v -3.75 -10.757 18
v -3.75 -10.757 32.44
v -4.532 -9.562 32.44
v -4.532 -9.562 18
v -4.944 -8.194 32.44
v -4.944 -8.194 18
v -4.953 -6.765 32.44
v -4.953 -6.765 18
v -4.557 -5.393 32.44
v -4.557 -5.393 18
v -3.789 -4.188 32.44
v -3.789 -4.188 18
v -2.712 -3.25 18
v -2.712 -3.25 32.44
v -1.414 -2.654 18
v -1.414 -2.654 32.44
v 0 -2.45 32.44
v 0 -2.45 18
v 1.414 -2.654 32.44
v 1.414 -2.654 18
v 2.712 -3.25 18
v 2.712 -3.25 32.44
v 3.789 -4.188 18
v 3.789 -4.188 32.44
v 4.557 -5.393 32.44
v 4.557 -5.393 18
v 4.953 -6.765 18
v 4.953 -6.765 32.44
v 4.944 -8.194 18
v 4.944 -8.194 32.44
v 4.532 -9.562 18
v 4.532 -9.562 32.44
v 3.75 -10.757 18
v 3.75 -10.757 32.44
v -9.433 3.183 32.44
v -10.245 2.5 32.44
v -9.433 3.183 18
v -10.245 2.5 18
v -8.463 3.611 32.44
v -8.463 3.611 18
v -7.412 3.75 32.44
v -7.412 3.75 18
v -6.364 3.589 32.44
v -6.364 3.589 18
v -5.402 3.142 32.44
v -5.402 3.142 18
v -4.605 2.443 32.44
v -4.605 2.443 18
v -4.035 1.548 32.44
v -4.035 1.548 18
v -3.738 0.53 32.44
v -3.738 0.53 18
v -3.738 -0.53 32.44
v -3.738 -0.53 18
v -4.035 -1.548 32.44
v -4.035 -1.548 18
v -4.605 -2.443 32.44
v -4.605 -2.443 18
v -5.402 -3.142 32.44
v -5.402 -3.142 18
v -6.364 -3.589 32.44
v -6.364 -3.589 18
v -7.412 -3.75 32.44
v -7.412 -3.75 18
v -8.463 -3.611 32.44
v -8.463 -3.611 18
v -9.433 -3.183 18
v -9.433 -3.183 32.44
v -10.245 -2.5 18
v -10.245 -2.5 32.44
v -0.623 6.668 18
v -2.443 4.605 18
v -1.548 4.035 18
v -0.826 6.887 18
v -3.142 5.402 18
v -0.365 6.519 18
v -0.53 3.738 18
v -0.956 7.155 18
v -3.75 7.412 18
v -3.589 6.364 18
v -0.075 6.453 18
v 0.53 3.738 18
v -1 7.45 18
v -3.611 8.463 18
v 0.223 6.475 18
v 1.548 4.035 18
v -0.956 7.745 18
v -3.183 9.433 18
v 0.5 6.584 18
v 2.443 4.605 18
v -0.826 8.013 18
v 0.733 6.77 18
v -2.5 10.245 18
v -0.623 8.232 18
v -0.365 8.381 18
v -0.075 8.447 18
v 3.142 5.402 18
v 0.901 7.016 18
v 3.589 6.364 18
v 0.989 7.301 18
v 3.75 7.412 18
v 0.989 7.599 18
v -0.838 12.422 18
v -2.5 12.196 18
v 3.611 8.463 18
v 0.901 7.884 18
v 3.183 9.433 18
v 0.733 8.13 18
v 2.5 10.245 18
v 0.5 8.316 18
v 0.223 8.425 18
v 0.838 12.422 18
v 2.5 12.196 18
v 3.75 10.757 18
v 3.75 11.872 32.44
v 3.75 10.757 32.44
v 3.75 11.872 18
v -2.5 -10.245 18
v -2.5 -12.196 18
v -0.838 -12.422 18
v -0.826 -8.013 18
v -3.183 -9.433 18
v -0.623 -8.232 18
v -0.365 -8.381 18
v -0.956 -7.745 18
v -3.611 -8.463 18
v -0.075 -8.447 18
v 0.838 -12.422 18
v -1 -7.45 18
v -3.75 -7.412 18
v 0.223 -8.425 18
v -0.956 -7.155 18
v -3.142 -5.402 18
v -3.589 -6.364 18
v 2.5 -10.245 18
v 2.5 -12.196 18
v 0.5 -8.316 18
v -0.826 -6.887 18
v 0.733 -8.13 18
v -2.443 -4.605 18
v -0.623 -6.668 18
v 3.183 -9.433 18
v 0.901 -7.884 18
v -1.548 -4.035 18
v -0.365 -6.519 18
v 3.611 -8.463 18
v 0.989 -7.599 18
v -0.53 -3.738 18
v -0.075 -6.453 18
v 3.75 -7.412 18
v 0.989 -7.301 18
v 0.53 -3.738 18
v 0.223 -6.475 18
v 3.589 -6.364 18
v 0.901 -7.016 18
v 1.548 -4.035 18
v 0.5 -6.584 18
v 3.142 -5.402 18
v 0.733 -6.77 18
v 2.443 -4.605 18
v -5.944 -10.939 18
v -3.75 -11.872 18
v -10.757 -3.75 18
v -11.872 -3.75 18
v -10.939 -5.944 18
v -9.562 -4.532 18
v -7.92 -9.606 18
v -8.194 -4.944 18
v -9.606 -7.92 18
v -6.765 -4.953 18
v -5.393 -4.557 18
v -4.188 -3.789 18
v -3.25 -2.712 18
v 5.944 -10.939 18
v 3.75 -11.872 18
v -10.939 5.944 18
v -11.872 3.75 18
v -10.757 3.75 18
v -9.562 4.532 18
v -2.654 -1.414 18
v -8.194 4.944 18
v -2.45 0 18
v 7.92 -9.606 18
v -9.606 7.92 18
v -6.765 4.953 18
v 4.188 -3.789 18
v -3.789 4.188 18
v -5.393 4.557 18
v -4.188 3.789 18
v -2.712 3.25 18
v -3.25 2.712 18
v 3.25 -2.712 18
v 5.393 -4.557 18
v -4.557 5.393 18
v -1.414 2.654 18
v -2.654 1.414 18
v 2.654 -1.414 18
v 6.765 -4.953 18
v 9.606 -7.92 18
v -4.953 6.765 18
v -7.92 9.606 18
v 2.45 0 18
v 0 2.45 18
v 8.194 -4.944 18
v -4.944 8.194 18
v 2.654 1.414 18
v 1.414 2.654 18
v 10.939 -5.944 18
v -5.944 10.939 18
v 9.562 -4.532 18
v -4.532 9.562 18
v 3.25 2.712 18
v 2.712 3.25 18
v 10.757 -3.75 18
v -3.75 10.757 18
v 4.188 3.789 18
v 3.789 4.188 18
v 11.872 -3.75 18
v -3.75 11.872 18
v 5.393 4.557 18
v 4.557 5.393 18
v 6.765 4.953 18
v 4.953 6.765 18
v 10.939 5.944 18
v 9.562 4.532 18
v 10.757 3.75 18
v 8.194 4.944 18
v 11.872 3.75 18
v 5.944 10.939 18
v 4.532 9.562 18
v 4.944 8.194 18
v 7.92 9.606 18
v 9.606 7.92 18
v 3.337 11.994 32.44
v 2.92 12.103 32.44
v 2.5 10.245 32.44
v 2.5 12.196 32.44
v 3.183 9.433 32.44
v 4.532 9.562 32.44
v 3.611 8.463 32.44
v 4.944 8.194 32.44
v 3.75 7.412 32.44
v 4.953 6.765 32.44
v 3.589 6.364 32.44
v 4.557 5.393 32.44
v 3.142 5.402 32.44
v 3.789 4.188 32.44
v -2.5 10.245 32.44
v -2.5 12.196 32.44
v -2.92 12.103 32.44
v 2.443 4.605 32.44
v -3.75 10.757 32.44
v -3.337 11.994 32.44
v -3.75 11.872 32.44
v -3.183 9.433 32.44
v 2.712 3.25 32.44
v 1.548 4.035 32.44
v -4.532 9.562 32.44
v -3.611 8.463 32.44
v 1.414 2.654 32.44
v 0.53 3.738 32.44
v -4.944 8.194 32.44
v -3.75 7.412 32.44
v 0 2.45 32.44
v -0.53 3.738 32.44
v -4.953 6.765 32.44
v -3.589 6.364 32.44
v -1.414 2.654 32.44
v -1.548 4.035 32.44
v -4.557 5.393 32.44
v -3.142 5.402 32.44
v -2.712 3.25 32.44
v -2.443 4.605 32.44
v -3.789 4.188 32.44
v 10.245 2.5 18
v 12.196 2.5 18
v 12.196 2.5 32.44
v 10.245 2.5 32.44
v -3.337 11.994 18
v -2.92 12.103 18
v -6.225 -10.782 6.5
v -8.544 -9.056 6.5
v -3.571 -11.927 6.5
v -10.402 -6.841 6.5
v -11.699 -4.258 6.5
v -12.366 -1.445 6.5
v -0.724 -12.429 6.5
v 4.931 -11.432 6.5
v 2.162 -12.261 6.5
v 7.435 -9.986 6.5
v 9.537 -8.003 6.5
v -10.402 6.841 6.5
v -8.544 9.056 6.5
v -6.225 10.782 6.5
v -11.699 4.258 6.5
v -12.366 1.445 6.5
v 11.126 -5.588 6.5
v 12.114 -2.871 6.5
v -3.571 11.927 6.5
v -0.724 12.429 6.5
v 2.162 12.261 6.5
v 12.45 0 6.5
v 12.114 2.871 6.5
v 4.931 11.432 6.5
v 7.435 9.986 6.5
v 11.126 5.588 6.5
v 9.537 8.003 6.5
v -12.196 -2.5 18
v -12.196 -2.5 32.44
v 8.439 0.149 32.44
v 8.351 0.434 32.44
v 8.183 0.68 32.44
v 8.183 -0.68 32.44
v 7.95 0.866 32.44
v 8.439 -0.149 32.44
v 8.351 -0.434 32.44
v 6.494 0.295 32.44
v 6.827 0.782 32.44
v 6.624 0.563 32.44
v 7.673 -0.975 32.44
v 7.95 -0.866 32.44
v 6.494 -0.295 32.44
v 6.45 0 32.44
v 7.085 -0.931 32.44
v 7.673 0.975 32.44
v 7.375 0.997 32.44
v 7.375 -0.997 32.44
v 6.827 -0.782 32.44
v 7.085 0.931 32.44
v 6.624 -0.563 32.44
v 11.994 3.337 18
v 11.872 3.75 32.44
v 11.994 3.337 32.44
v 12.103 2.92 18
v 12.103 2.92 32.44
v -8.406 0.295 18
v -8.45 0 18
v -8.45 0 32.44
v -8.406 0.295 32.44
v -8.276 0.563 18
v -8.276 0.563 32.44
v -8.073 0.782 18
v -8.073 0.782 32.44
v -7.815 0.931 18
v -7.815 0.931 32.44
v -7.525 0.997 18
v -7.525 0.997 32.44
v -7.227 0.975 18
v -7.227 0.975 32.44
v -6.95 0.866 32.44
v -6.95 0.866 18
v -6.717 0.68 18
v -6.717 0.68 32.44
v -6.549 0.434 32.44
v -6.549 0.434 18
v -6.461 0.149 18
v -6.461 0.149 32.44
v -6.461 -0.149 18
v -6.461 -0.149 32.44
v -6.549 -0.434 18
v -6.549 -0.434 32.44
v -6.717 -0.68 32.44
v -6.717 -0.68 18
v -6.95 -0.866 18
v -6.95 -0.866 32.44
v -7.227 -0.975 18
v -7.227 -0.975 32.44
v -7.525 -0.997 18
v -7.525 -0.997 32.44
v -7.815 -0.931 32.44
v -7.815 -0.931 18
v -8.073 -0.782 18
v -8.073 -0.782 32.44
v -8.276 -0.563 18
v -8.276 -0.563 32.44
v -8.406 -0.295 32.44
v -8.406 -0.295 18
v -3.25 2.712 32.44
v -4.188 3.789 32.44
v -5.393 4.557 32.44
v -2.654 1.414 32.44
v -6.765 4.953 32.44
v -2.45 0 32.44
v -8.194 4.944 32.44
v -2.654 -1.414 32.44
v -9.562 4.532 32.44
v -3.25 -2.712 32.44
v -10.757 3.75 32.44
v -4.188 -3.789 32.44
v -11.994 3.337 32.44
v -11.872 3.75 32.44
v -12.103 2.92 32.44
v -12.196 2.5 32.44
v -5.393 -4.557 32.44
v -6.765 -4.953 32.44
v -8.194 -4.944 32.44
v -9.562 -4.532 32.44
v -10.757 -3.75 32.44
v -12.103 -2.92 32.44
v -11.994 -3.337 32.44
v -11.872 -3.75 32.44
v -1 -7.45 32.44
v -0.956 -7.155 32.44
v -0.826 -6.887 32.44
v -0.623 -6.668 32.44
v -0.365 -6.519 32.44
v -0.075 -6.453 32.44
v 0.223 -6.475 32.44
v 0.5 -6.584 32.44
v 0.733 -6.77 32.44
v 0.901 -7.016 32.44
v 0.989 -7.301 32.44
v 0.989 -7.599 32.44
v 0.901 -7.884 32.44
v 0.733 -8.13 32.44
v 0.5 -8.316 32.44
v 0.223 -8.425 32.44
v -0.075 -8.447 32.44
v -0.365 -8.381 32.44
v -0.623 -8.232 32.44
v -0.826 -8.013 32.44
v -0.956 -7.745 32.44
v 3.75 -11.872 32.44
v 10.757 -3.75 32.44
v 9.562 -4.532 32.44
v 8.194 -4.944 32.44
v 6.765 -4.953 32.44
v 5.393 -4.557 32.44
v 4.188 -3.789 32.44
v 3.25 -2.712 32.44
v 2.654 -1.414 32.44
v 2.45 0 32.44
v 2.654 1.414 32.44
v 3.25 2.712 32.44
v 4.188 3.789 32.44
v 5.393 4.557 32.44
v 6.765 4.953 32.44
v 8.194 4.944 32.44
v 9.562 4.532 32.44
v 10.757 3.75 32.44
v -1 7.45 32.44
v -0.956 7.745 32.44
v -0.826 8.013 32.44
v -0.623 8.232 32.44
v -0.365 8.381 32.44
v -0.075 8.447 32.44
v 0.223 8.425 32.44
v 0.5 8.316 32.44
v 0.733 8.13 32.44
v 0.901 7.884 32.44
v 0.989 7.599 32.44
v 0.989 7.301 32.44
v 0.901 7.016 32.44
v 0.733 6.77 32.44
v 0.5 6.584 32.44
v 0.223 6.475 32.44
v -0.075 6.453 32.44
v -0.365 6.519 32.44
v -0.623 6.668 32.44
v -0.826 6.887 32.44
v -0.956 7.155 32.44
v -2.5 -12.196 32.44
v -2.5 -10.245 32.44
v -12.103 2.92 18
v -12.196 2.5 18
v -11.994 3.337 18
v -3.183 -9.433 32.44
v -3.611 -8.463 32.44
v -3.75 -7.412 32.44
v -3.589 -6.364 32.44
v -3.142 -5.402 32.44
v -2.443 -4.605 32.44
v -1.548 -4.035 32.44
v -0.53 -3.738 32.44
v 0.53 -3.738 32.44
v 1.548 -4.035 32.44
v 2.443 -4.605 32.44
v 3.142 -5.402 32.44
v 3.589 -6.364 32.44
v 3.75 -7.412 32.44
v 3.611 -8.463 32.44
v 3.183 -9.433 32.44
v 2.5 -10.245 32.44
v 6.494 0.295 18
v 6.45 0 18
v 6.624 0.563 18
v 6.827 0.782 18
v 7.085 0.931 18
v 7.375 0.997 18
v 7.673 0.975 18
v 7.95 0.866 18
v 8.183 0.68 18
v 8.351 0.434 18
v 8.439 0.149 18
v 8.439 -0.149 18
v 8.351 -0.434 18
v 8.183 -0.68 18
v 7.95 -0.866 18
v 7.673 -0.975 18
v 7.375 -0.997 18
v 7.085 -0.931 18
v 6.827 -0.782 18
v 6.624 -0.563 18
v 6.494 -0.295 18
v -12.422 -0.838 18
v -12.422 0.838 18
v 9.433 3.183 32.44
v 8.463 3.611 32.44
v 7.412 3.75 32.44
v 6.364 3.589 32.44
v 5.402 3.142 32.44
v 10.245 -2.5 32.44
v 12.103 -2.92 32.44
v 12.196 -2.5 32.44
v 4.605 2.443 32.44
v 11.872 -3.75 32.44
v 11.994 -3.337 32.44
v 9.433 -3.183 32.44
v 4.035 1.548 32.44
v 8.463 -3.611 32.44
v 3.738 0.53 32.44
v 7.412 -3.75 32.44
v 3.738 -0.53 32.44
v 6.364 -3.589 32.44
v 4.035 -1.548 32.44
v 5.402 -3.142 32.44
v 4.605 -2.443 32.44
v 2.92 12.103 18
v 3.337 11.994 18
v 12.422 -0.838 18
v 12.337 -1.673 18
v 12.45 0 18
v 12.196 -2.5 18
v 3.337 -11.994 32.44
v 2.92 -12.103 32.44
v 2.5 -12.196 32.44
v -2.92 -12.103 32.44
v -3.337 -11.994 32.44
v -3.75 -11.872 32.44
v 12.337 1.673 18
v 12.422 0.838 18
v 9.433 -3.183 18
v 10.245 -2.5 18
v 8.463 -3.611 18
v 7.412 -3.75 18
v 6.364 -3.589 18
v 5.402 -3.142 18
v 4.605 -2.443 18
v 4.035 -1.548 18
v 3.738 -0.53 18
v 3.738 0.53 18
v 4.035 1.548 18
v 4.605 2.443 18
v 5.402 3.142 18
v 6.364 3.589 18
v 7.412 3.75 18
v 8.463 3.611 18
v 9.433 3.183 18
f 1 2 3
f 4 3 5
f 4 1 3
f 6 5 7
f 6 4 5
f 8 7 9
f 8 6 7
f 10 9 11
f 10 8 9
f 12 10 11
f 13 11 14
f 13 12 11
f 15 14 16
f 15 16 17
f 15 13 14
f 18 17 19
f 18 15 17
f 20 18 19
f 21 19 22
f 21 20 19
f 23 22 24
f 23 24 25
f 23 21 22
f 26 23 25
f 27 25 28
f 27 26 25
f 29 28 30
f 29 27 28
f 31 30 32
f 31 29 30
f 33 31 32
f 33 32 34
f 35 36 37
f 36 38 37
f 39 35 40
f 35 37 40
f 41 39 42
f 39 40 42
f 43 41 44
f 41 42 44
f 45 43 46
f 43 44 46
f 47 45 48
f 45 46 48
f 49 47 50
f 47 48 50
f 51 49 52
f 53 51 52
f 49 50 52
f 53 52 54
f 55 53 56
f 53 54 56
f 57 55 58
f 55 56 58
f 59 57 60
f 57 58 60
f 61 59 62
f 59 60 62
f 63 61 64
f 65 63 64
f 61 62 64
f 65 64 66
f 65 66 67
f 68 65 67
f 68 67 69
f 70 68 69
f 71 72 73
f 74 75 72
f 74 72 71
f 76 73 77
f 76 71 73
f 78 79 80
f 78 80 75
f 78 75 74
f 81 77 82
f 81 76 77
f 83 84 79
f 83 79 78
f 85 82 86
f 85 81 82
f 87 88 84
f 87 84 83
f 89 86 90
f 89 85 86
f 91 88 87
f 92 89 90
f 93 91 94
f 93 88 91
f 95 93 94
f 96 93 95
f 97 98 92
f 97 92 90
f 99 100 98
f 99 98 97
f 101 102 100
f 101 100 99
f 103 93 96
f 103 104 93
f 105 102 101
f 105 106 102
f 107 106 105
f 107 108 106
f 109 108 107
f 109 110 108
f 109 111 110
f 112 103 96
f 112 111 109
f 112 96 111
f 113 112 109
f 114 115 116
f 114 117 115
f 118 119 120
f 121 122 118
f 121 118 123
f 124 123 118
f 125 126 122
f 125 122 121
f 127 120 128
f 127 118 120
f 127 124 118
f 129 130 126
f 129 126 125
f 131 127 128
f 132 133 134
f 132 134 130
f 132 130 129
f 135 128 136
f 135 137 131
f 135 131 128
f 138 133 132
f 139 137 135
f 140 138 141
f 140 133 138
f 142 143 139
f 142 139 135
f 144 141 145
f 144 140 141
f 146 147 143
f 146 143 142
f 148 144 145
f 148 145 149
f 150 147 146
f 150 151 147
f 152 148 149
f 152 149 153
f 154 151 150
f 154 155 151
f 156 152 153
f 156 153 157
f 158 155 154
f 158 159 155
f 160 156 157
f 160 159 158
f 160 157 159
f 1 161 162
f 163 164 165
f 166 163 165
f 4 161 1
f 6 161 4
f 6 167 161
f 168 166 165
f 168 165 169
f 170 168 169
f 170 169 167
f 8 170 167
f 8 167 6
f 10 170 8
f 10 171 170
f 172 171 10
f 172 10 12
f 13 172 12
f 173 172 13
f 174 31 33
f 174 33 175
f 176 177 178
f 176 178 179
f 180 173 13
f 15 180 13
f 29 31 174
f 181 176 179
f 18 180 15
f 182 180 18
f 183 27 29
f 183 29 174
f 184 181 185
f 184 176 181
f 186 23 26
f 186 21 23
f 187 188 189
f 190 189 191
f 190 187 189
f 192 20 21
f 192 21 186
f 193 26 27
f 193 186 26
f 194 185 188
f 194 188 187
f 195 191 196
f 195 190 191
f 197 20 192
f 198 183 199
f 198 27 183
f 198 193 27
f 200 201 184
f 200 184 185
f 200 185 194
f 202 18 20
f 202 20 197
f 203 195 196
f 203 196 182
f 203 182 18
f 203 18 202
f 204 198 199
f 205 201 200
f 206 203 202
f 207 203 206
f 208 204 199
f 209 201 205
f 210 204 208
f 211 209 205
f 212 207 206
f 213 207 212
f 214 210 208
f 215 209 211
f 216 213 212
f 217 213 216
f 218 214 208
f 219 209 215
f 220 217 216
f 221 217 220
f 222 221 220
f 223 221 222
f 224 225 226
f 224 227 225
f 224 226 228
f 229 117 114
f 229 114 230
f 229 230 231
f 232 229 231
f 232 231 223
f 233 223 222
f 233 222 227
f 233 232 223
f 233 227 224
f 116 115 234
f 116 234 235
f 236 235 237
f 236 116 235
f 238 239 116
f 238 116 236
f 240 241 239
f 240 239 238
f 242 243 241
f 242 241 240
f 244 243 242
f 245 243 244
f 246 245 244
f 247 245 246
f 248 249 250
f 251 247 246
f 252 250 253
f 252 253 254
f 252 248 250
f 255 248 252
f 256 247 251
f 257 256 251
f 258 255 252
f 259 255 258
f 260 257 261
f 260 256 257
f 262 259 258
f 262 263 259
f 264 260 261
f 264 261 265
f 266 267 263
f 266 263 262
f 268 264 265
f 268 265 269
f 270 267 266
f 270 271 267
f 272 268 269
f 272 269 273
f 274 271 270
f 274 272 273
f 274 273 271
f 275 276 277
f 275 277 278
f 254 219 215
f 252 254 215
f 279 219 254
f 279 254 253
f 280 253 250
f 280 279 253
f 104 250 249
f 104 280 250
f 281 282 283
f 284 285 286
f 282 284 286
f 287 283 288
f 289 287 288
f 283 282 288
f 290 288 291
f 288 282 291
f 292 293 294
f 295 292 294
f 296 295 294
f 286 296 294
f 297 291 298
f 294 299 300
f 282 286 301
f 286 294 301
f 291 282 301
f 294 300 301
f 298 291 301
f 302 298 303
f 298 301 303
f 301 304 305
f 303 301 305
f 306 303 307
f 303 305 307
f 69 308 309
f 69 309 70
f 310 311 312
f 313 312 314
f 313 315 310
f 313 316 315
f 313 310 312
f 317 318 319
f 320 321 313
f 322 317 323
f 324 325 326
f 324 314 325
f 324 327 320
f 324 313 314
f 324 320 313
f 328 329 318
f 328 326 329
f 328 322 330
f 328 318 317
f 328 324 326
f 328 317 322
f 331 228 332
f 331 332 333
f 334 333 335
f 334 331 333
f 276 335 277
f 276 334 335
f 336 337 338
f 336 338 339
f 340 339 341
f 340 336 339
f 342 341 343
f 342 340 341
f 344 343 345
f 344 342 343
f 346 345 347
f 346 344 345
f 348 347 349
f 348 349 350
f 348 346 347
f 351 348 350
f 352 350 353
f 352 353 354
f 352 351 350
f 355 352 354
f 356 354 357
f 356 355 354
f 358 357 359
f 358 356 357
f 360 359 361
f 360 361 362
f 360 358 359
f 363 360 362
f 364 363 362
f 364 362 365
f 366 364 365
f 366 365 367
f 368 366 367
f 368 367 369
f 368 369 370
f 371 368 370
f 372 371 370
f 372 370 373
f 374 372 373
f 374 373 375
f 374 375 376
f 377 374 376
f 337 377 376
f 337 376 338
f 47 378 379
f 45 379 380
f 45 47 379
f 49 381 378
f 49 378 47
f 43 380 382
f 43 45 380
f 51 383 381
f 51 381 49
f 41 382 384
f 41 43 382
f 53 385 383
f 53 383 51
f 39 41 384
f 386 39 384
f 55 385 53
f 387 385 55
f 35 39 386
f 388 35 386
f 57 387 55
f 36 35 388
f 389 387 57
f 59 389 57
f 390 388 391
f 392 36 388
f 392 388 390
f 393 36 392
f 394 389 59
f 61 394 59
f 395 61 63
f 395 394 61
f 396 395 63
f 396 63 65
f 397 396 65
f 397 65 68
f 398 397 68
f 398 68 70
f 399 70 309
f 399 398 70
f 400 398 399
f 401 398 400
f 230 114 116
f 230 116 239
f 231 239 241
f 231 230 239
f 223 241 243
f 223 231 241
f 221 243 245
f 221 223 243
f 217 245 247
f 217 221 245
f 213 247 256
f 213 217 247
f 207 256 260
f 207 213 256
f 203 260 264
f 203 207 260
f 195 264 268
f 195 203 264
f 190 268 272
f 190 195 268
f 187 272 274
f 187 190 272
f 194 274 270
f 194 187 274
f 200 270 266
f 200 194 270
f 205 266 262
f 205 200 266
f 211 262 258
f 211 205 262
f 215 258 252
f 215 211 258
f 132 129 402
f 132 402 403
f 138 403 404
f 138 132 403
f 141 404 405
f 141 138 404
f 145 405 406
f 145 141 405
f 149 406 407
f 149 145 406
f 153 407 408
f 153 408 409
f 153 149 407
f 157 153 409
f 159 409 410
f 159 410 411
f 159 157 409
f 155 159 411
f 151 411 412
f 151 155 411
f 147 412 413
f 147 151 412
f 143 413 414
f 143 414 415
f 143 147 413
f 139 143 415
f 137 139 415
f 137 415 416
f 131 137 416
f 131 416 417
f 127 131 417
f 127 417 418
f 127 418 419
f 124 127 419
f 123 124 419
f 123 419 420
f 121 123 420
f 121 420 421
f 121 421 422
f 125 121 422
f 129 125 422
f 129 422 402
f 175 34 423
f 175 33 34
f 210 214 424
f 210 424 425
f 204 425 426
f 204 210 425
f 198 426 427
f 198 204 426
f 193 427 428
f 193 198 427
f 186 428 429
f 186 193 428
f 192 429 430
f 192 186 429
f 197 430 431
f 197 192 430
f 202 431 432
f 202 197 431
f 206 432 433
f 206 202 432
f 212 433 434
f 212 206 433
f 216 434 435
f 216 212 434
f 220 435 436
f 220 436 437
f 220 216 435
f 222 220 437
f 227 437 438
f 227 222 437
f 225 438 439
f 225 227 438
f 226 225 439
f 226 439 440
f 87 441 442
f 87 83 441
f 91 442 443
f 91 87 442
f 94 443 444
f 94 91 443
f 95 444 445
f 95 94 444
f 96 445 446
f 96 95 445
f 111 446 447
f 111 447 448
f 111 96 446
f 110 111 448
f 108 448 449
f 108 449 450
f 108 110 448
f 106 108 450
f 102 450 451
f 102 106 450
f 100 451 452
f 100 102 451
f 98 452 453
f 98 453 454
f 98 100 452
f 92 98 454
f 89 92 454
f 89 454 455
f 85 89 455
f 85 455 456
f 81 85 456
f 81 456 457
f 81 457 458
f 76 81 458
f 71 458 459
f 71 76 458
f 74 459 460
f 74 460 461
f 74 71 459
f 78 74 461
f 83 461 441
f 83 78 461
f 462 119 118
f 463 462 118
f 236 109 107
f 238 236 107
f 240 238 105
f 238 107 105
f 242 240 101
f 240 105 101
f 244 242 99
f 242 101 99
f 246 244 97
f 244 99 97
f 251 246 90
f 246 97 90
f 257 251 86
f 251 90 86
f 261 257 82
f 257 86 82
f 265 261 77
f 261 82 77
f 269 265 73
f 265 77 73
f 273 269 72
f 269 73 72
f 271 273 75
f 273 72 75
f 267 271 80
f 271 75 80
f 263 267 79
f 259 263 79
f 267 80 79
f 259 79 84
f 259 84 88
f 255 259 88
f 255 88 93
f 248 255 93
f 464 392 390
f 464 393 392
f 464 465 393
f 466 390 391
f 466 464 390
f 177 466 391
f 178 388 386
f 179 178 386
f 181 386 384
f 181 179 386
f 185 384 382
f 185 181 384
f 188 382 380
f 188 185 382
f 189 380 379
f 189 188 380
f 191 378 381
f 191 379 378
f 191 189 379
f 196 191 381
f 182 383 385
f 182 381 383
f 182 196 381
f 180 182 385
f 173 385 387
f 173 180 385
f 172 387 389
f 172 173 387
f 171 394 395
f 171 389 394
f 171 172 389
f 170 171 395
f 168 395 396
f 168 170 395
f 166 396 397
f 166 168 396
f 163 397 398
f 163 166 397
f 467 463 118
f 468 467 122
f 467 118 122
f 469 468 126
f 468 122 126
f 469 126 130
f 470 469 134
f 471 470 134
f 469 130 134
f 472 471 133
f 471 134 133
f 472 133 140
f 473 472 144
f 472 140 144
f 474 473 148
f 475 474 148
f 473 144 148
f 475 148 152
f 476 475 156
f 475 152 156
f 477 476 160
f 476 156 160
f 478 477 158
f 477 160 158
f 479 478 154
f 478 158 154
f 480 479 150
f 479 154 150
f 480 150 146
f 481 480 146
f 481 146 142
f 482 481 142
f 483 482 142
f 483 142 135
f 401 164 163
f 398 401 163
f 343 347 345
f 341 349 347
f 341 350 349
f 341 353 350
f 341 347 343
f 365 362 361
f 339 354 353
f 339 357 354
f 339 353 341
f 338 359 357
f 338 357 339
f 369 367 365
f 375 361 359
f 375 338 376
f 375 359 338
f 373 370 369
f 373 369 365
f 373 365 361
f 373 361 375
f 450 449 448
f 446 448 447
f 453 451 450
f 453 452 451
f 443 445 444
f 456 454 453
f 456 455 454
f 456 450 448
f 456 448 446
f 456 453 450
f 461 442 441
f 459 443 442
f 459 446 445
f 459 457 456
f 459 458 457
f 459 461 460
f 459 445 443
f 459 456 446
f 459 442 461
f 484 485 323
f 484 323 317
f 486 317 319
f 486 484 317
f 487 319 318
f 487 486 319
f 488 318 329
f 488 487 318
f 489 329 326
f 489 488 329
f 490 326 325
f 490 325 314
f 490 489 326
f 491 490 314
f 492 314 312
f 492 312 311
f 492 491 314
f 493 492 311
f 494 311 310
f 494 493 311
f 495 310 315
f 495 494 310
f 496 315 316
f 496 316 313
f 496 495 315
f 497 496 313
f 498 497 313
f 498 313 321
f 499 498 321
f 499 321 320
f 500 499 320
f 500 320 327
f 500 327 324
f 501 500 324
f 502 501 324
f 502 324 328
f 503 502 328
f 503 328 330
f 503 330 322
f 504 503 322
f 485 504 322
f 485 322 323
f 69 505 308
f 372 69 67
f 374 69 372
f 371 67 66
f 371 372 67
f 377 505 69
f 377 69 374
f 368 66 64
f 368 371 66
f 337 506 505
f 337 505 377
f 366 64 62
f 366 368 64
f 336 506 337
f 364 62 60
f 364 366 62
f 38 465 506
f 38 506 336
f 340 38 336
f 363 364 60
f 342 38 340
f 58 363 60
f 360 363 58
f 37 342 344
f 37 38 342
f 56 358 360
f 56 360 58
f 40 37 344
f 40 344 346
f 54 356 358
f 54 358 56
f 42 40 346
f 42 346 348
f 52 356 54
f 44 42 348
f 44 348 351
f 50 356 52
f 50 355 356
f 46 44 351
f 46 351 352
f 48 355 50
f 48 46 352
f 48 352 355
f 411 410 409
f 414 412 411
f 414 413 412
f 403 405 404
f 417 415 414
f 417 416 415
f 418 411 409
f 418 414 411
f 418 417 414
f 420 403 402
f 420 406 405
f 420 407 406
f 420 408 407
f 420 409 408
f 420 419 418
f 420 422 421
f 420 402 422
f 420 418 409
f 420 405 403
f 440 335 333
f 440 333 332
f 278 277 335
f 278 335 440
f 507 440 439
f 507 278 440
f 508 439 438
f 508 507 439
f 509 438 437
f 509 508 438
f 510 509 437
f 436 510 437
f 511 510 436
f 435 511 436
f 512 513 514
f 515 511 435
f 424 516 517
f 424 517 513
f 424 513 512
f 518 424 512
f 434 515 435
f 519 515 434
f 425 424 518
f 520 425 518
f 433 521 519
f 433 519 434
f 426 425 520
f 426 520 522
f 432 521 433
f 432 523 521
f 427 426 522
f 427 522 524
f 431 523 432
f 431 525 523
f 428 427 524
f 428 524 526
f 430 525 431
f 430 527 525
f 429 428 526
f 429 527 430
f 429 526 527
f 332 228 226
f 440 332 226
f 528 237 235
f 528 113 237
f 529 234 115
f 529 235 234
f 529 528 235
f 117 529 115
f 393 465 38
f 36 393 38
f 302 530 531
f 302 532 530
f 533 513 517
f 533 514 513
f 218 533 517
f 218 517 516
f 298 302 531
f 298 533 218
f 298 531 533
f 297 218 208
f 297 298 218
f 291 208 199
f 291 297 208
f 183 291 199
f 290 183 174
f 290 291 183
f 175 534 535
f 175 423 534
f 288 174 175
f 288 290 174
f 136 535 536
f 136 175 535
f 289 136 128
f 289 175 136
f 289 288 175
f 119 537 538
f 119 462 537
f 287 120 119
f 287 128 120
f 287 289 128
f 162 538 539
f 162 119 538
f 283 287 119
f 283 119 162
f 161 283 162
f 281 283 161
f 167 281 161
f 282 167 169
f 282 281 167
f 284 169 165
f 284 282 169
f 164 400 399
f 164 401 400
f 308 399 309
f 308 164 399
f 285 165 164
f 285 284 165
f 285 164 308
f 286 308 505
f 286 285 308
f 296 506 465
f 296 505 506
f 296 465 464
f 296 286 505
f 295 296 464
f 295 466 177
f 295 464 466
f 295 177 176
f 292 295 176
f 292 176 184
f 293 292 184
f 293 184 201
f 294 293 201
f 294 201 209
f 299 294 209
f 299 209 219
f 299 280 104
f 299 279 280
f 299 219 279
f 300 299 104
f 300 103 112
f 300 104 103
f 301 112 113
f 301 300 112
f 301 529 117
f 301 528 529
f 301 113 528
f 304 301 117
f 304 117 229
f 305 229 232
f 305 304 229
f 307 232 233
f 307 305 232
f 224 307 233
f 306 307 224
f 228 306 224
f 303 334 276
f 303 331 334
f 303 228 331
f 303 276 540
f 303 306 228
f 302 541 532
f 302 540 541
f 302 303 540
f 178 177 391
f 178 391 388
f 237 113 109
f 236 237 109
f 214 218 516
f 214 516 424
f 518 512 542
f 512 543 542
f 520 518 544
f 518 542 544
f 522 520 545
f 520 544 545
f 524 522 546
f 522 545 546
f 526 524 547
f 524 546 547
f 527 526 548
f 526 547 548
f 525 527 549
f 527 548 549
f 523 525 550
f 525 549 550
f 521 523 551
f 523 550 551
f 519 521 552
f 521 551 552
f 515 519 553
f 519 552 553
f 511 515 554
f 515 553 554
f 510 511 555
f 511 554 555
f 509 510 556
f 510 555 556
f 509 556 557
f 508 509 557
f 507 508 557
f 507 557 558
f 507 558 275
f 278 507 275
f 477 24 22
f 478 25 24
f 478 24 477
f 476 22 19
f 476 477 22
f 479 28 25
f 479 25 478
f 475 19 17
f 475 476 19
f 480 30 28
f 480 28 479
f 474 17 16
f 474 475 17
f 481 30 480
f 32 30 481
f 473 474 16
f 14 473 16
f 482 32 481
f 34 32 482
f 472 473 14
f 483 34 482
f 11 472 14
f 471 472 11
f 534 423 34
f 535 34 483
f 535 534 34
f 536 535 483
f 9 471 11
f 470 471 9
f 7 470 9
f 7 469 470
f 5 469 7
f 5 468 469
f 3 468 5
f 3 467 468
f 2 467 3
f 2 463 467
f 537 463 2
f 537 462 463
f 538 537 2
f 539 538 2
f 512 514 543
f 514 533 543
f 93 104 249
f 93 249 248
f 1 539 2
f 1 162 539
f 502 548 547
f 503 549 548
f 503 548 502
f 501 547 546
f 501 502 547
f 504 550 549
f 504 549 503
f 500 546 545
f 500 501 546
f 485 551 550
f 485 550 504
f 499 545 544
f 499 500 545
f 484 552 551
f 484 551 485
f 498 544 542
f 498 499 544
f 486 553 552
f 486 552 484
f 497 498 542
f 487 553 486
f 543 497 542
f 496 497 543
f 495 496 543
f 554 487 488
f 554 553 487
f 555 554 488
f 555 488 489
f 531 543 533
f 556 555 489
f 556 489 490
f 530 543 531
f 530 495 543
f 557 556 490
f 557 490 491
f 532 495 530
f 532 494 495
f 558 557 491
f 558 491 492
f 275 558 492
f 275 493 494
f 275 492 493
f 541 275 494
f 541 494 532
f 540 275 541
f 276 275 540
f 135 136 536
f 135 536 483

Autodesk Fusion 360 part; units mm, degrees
sketch "Sketch1" plane through (0, 0, 0) normal (0, 0, 1) x (1, 0, 0)
  circle A0 centre (0, 0) radius 12.45
  dimension "d1" = 24.9
extrude "Extrude1" add sketch "Sketch1" along normal blind 18
sketch "Sketch2" plane through (0, 0, 18) normal (0, 0, 1) x (-1, 0, 0)
  circle A0 centre (0, 0) radius 12.45
  line L0 (0, 0) -> (0, -12.45)
  line L1 (0, 0) -> (-12.45, 0)
  line L2 (0, 0) -> (0, 12.45)
  line L3 (0, 0) -> (12.45, 0)
  line L4 (-12.45, 0) -> (-2.45, 0)
  circle A1 centre (-7.45, 0) radius 5
  line L5 (12.45, 0) -> (2.45, 0)
  line L6 (0, 12.45) -> (0, 2.45)
  line L7 (0, -12.45) -> (0, -2.45)
  circle A2 centre (0, -7.45) radius 5
  circle A3 centre (7.45, 0) radius 5
  circle A4 centre (0, 7.45) radius 5
  circle A5 centre (-7.45, 0) radius 3.75
  circle A6 centre (0, -7.45) radius 3.75
  circle A7 centre (0, 7.45) radius 3.75
  circle A8 centre (7.45, 0) radius 3.75
  circle A9 centre (-7.45, 0) radius 1
  circle A10 centre (0, -7.45) radius 1
  circle A11 centre (0, 7.45) radius 1
  circle A12 centre (7.45, 0) radius 1
  line L8 (-12.45, 0) -> (-12.45, -2.5)
  line L9 (-12.45, 0) -> (-12.45, 2.5)
  line L10 (-12.45, 2.5) -> (-11.7801, 2.5)
  line L11 (-12.45, -2.5) -> (-11.7801, -2.5)
  line L12 (0, -12.45) -> (-2.5, -12.45)
  line L13 (0, -12.45) -> (2.5, -12.45)
  line L14 (-2.5, -12.45) -> (-2.5, -11.7801)
  line L15 (12.45, 0) -> (12.45, -2.5)
  line L16 (12.45, 0) -> (12.45, 2.5)
  line L17 (12.45, 2.5) -> (10.2451, 2.5)
  line L18 (12.45, -2.5) -> (10.2451, -2.5)
  line L19 (2.5, -12.45) -> (2.5, -11.7801)
  line L20 (-2.5, -12.45) -> (-3.75, -12.45)
  line L21 (-3.75, -12.45) -> (-3.75, -10.7572)
  line L22 (2.5, -12.45) -> (3.75, -12.45)
  line L23 (3.75, -12.45) -> (3.75, -10.7572)
  line L24 (-3.75, -10.7572) -> (-3.75, -7.45)
  line L25 (2.5, -11.7801) -> (2.5, -10.2451)
  line L26 (-2.5, -11.7801) -> (-2.5, -10.2451)
  line L27 (3.75, -10.7572) -> (3.75, -7.45)
  line L28 (12.45, -2.5) -> (12.45, -3.75)
  line L29 (12.45, -3.75) -> (7.45, -3.75)
  line L30 (12.45, 1.25) -> (12.45, 2.5)
  line L31 (12.45, 2.5) -> (10.2451, 2.5)
  line L32 (12.45, 2.5) -> (12.45, 3.75)
  line L33 (12.45, 3.75) -> (7.45, 3.75)
  line L34 (0, 12.45) -> (-2.5, 12.45)
  line L35 (0, 12.45) -> (2.5, 12.45)
  line L36 (2.5, 12.45) -> (2.5, 10.2451)
  line L37 (2.5, 12.45) -> (3.75, 12.45)
  line L38 (3.75, 12.45) -> (3.75, 7.45)
  line L39 (-3.75, 7.45) -> (-3.75, 12.45)
  line L40 (-3.75, 12.45) -> (-2.5, 12.45)
  line L41 (-2.5, 12.45) -> (-2.5, 10.2451)
  line L42 (-11.7801, 2.5) -> (-10.2451, 2.5)
  line L43 (-11.7801, -2.5) -> (-10.2451, -2.5)
  line L44 (-12.45, -2.5) -> (-12.45, -3.75)
  line L45 (-12.45, 2.5) -> (-12.45, 3.75)
  line L46 (-12.45, 3.75) -> (-7.45, 3.75)
  line L47 (-12.45, -3.75) -> (-7.45, -3.75)
  dimension "d4" = 10
  dimension "d5" = 10
  dimension "d6" = 10
  dimension "d7" = 10
  dimension "d8" = 7.5
  dimension "d9" = 7.5
  dimension "d10" = 7.5
  dimension "d11" = 7.5
  dimension "d12" = 2
  dimension "d13" = 2
  dimension "d14" = 2
  dimension "d15" = 2
  dimension "d16" = 2.5
  dimension "d17" = 2.5
  dimension "d18" = 2.5
  dimension "d19" = 2.5
  dimension "d20" = 2.5
  dimension "d21" = 2.5
  dimension "d22" = 1.25
  dimension "d23" = 1.25
  dimension "d24" = 1.25
  dimension "d26" = 1.25
  dimension "d31" = 2.5
  dimension "d32" = 2.5
  dimension "d33" = 1.25
  dimension "d36" = 1.25
  dimension "d37" = 1.25
extrude "Extrude2" add sketch "Sketch2" along normal blind 14.44 contours A0 A2 L19 L23 | L0 L7 A2 A6 L27 | A2 A6 L25 L27 | L0 L7 A2 A6 L24 | A0 A2 L14 L21 | A2 A6 L24 L26 | L0 L7 A10 | L0 L7 A10
extrude "Extrude3" add sketch "Sketch2" along normal blind 14.44 contours A0 A3 L17 L31 L33 | A0 A3 L18 L29 | A3 A8 L17 L31 L33 | A3 A8 L18 L29 | L3 L5 A12 | L3 L5 A12 | L3 L5 A3 A8 L33 | L3 L5 A3 A8 L29
extrude "Extrude4" add sketch "Sketch2" along normal blind 14.44 contours A0 A4 L36 L38 | A4 A7 L36 L38 | L2 L6 A4 A7 L38 | L2 L6 A4 A7 L39 | A0 A4 L39 L41 | A4 A7 L39 L41 | L2 L6 A11 | L2 L6 A11
extrude "Extrude5" add sketch "Sketch2" along normal blind 14.44 contours L1 L4 A1 A5 L47 | L1 L4 A1 A5 L46 | A1 A5 L42 L46 | A0 A1 L10 L46 | A0 A1 L11 L47 | A1 A5 L43 L47 | L1 L4 A9 | L1 L4 A9
extrude "Extrude6" cut sketch "Sketch1" along normal blind 5
extrude "Extrude7" cut 1 faces at (3.0323, -6.4892, 5) along direction (0, 0, 1) blind 1.5
